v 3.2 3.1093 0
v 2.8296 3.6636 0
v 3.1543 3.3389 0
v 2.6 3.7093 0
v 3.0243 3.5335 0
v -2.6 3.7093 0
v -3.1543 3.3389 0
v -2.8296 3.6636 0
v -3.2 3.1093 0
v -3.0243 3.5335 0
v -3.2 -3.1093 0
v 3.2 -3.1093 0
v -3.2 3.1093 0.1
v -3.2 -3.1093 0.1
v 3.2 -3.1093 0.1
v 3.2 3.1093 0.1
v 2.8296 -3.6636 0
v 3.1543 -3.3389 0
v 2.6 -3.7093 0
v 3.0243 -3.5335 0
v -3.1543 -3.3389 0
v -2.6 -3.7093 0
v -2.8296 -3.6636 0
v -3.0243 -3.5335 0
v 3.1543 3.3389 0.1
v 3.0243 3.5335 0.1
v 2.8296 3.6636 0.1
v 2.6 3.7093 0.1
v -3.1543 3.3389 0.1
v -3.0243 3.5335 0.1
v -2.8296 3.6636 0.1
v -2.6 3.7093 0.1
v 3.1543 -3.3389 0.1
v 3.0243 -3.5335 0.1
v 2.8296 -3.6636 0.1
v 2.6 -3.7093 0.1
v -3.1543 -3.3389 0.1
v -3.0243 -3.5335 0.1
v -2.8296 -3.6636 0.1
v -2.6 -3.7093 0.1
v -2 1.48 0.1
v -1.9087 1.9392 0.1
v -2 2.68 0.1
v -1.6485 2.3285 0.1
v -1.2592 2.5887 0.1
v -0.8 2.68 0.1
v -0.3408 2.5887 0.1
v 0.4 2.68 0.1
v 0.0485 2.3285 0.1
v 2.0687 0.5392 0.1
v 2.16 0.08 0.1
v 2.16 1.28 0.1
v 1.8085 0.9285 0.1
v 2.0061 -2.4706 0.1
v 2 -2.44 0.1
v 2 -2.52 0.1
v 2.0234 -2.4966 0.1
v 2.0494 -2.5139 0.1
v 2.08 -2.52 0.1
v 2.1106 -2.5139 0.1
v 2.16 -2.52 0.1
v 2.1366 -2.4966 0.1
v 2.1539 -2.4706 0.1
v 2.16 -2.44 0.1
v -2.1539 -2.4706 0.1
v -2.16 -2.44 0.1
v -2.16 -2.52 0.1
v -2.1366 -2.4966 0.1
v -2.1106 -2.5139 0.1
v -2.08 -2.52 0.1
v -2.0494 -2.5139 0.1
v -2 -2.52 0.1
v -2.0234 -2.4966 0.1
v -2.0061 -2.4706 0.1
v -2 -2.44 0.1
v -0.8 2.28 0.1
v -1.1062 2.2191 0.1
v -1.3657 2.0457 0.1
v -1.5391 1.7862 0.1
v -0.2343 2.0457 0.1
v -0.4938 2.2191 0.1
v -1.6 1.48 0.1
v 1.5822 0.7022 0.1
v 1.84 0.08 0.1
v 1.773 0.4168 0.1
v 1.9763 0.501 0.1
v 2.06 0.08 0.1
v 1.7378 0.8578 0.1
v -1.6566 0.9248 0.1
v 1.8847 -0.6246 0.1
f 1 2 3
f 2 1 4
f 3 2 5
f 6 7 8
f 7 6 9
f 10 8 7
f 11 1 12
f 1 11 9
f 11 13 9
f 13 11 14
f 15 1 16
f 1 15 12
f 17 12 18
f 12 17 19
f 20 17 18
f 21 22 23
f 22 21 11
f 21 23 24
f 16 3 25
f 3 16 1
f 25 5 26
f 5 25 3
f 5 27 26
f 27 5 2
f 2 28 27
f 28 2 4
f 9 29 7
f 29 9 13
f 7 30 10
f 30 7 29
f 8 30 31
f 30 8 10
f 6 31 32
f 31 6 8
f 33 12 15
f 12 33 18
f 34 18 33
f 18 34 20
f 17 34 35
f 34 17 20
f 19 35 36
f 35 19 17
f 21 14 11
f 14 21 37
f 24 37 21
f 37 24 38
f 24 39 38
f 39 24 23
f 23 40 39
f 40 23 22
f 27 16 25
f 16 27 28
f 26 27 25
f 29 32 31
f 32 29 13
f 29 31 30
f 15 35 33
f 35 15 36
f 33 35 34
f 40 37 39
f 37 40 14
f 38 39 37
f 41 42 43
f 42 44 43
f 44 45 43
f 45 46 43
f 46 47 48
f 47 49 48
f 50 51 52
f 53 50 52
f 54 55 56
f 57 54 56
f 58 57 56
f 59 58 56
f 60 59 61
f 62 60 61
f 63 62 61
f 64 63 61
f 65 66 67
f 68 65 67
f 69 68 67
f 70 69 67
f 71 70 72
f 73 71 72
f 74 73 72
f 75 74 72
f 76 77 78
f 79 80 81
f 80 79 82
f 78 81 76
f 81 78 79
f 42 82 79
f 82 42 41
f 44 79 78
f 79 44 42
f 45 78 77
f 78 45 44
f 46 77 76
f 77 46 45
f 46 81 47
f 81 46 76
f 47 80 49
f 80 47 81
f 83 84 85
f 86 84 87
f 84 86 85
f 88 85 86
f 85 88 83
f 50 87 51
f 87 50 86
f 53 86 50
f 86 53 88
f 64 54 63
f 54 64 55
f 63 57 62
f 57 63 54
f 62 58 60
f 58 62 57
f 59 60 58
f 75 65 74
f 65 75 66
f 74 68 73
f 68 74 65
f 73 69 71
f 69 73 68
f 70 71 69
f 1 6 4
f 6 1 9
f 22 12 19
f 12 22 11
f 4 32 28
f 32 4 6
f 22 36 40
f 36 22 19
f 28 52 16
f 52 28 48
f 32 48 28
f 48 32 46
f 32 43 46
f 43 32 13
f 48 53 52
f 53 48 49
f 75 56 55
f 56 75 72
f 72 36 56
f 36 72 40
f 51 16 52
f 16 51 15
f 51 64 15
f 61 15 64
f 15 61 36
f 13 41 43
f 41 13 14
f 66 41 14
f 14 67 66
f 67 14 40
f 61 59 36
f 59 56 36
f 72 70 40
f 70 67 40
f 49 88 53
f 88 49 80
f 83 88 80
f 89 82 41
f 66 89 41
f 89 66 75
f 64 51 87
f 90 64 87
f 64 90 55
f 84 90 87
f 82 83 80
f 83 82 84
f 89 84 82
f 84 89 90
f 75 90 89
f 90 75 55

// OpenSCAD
// file: ../p/box3u12.scad
use <../lib.scad>
function ldraw_lib__box3u12() = [
// 0 Box with 3 Parallel Faces without Any Edges
// 0 Name: box3u12.dat
// 0 Author: J.C. Tchang [tchang]
// 0 !LDRAW_ORG Primitive UPDATE 2014-02
// 0 !LICENSE Licensed under CC BY 4.0 : see CAreadme.txt
// 
// 0 BFC CERTIFY CCW
  [0,"BFC","CERTIFY"],
  [0,"BFC","CCW"],
// 
// 0 !HISTORY 2014-12-23 [PTadmin] Official Update 2014-02
// 
// 
// 4 16 -1 1 1 1 1 1 1 1 -1 -1 1 -1
  [4,16,-1,1,1,1,1,1,1,1,-1,-1,1,-1],
// 4 16 -1 1 1 -1 0 1 1 0 1 1 1 1
  [4,16,-1,1,1,-1,0,1,1,0,1,1,1,1],
// 4 16 1 1 -1 1 0 -1 -1 0 -1 -1 1 -1
  [4,16,1,1,-1,1,0,-1,-1,0,-1,-1,1,-1],
];
module ldraw_lib__box3u12(step=0, col=false, unit=2/5, alt=false, line=0.2, solid=!$preview)
    makepoly(ldraw_lib__box3u12(), step=step, col=col, unit=unit, alt=alt, line=line, solid=solid);
ldraw_lib__box3u12(line=0.2);
// file: ../p/3-8ring2.scad
use <../lib.scad>
function ldraw_lib__3_8ring2() = [
// 0 Ring  2 x 0.375
// 0 Name: 3-8ring2.dat
// 0 Author: Willy Tschager [Holly-Wood]
// 0 !LDRAW_ORG Primitive UPDATE 2024-01
// 0 !LICENSE Licensed under CC BY 4.0 : see CAreadme.txt
// 
// 0 BFC CERTIFY CCW
  [0,"BFC","CERTIFY"],
  [0,"BFC","CCW"],
// 
// 0 !HISTORY 2005-12-28 [PTadmin] Official Update 2005-01
// 0 !HISTORY 2007-06-24 [PTadmin] Header formatted for Contributor Agreement
// 0 !HISTORY 2008-07-01 [PTadmin] Official Update 2008-01
// 0 !HISTORY 2024-01-11 [Holly-Wood] Complete regeneration, original by guyvivan
// 0 !HISTORY 2024-01-29 [OrionP] Official Update 2024-01
// 
// 4 16 3 0 0 2.7717 0 1.1481 1.8478 0 0.7654 2 0 0
  [4,16,3,0,0,2.7717,0,1.1481,1.8478,0,0.7654,2,0,0],
// 4 16 2.7717 0 1.1481 2.1213 0 2.1213 1.4142 0 1.4142 1.8478 0 0.7654
  [4,16,2.7717,0,1.1481,2.1213,0,2.1213,1.4142,0,1.4142,1.8478,0,0.7654],
// 4 16 2.1213 0 2.1213 1.1481 0 2.7717 0.7654 0 1.8478 1.4142 0 1.4142
  [4,16,2.1213,0,2.1213,1.1481,0,2.7717,0.7654,0,1.8478,1.4142,0,1.4142],
// 4 16 1.1481 0 2.7717 0 0 3 0 0 2 0.7654 0 1.8478
  [4,16,1.1481,0,2.7717,0,0,3,0,0,2,0.7654,0,1.8478],
// 4 16 0 0 3 -1.1481 0 2.7717 -0.7654 0 1.8478 0 0 2
  [4,16,0,0,3,-1.1481,0,2.7717,-0.7654,0,1.8478,0,0,2],
// 4 16 -1.1481 0 2.7717 -2.1213 0 2.1213 -1.4142 0 1.4142 -0.7654 0 1.8478
  [4,16,-1.1481,0,2.7717,-2.1213,0,2.1213,-1.4142,0,1.4142,-0.7654,0,1.8478],
// 0 // Build by LDPartEditor (PrimGen 2.X)
];
module ldraw_lib__3_8ring2(step=0, col=false, unit=2/5, alt=false, line=0.2, solid=!$preview)
    makepoly(ldraw_lib__3_8ring2(), step=step, col=col, unit=unit, alt=alt, line=line, solid=solid);
ldraw_lib__3_8ring2(line=0.2);
// file: ../p/3-8ndis.scad
use <../lib.scad>
function ldraw_lib__3_8ndis() = [
// 0 Disc Negative 0.375
// 0 Name: 3-8ndis.dat
// 0 Author: Alex Taylor [anathema]
// 0 !LDRAW_ORG Primitive UPDATE 2009-02
// 0 !LICENSE Licensed under CC BY 4.0 : see CAreadme.txt
// 
// 0 BFC CERTIFY CCW
  [0,"BFC","CERTIFY"],
  [0,"BFC","CCW"],
// 
// 0 !HISTORY 2009-09-03 [PTadmin] Official Update 2009-02
// 
// 
// 3 16 1 0 1 0.9239 0 0.3827 1 0 0
  [3,16,1,0,1,0.9239,0,0.3827,1,0,0],
// 3 16 1 0 1 0.7071 0 0.7071 0.9239 0 0.3827
  [3,16,1,0,1,0.7071,0,0.7071,0.9239,0,0.3827],
// 3 16 1 0 1 0.3827 0 0.9239 0.7071 0 0.7071
  [3,16,1,0,1,0.3827,0,0.9239,0.7071,0,0.7071],
// 3 16 1 0 1 0 0 1 0.3827 0 0.9239
  [3,16,1,0,1,0,0,1,0.3827,0,0.9239],
// 3 16 -1 0 1 -0.3827 0 0.9239 0 0 1
  [3,16,-1,0,1,-0.3827,0,0.9239,0,0,1],
// 3 16 -1 0 1 -0.7071 0 0.7071 -0.3827 0 0.9239
  [3,16,-1,0,1,-0.7071,0,0.7071,-0.3827,0,0.9239],
// 0
];
module ldraw_lib__3_8ndis(step=0, col=false, unit=2/5, alt=false, line=0.2, solid=!$preview)
    makepoly(ldraw_lib__3_8ndis(), step=step, col=col, unit=unit, alt=alt, line=line, solid=solid);
ldraw_lib__3_8ndis(line=0.2);
// file: ../p/3-8chrd.scad
use <../lib.scad>
function ldraw_lib__3_8chrd() = [
// 0 Chord 0.375
// 0 Name: 3-8chrd.dat
// 0 Author: Donald Sutter [technog]
// 0 !LDRAW_ORG Primitive UPDATE 2005-01
// 0 !LICENSE Licensed under CC BY 4.0 : see CAreadme.txt
// 
// 0 BFC CERTIFY CCW
  [0,"BFC","CERTIFY"],
  [0,"BFC","CCW"],
// 
// 0 !HISTORY 2004-01-07 [Steffen] added primitive code for POVray
// 0 !HISTORY 2004-03-18 [mkennedy] removed pov code and rearanged polygons.
// 0 !HISTORY 2004-09-12 [cwdee] reversed winding and standardised precision
// 0 !HISTORY 2005-12-28 [PTadmin] Official Update 2005-01
// 0 !HISTORY 2007-06-24 [PTadmin] Header formatted for Contributor Agreement
// 0 !HISTORY 2008-07-01 [PTadmin] Official Update 2008-01
// 
// 
// 3 16 0.7071 0 0.7071 0.3827 0 0.9239 0 0 1
  [3,16,0.7071,0,0.7071,0.3827,0,0.9239,0,0,1],
// 4 16 0.9239 0 0.3827 -0.3827 0 0.9239 -0.7071 0 0.7071 1 0 0
  [4,16,0.9239,0,0.3827,-0.3827,0,0.9239,-0.7071,0,0.7071,1,0,0],
// 4 16 0.7071 0 0.7071 0 0 1 -0.3827 0 0.9239 0.9239 0 0.3827
  [4,16,0.7071,0,0.7071,0,0,1,-0.3827,0,0.9239,0.9239,0,0.3827],
// 0
];
module ldraw_lib__3_8chrd(step=0, col=false, unit=2/5, alt=false, line=0.2, solid=!$preview)
    makepoly(ldraw_lib__3_8chrd(), step=step, col=col, unit=unit, alt=alt, line=line, solid=solid);
ldraw_lib__3_8chrd(line=0.2);
// file: ../p/2-4ndis.scad
use <../lib.scad>
function ldraw_lib__2_4ndis() = [
// 0 Disc Negative 0.5
// 0 Name: 2-4ndis.dat
// 0 Author: James Jessiman
// 0 !LDRAW_ORG Primitive UPDATE 2012-01
// 0 !LICENSE Licensed under CC BY 4.0 : see CAreadme.txt
// 
// 0 BFC CERTIFY CCW
  [0,"BFC","CERTIFY"],
  [0,"BFC","CCW"],
// 
// 0 !HISTORY 2002-03-23 [sbliss] Added BFC statement; compacted code
// 0 !HISTORY 2002-04-25 [PTadmin] Official Update 2002-02
// 0 !HISTORY 2007-06-24 [PTadmin] Header formatted for Contributor Agreement
// 0 !HISTORY 2008-07-01 [PTadmin] Official Update 2008-01
// 0 !HISTORY 2012-02-16 [Philo] Changed to CCW
// 0 !HISTORY 2012-03-30 [PTadmin] Official Update 2012-01
// 
// 
// 3 16 0.9239 0 0.3827 1 0 0 1 0 1
  [3,16,0.9239,0,0.3827,1,0,0,1,0,1],
// 3 16 0.7071 0 0.7071 0.9239 0 0.3827 1 0 1
  [3,16,0.7071,0,0.7071,0.9239,0,0.3827,1,0,1],
// 3 16 0.3827 0 0.9239 0.7071 0 0.7071 1 0 1
  [3,16,0.3827,0,0.9239,0.7071,0,0.7071,1,0,1],
// 3 16 0 0 1 0.3827 0 0.9239 1 0 1
  [3,16,0,0,1,0.3827,0,0.9239,1,0,1],
// 3 16 -0.3827 0 0.9239 0 0 1 -1 0 1
  [3,16,-0.3827,0,0.9239,0,0,1,-1,0,1],
// 3 16 -0.7071 0 0.7071 -0.3827 0 0.9239 -1 0 1
  [3,16,-0.7071,0,0.7071,-0.3827,0,0.9239,-1,0,1],
// 3 16 -0.9239 0 0.3827 -0.7071 0 0.7071 -1 0 1
  [3,16,-0.9239,0,0.3827,-0.7071,0,0.7071,-1,0,1],
// 3 16 -1 0 0 -0.9239 0 0.3827 -1 0 1
  [3,16,-1,0,0,-0.9239,0,0.3827,-1,0,1],
];
module ldraw_lib__2_4ndis(step=0, col=false, unit=2/5, alt=false, line=0.2, solid=!$preview)
    makepoly(ldraw_lib__2_4ndis(), step=step, col=col, unit=unit, alt=alt, line=line, solid=solid);
ldraw_lib__2_4ndis(line=0.2);
// file: ../p/2-4chrd.scad
use <../lib.scad>
function ldraw_lib__2_4chrd() = [
// 0 Chord 0.5
// 0 Name: 2-4chrd.dat
// 0 Author: Philippe Hurbain [Philo]
// 0 !LDRAW_ORG Primitive UPDATE 2014-01
// 0 !LICENSE Licensed under CC BY 4.0 : see CAreadme.txt
// 
// 0 BFC CERTIFY CCW
  [0,"BFC","CERTIFY"],
  [0,"BFC","CCW"],
// 
// 0 !HISTORY 2014-06-21 [PTadmin] Official Update 2014-01
// 
// 
// 4 16 0.9239 0 0.3827 -0.9239 0 0.3827 -1 0 0 1 0 0
  [4,16,0.9239,0,0.3827,-0.9239,0,0.3827,-1,0,0,1,0,0],
// 4 16 0.7071 0 0.7071 -0.7071 0 0.7071 -0.9239 0 0.3827 0.9239 0 0.3827
  [4,16,0.7071,0,0.7071,-0.7071,0,0.7071,-0.9239,0,0.3827,0.9239,0,0.3827],
// 4 16 0.3827 0 0.9239 -0.3827 0 0.9239 -0.7071 0 0.7071 0.7071 0 0.7071
  [4,16,0.3827,0,0.9239,-0.3827,0,0.9239,-0.7071,0,0.7071,0.7071,0,0.7071],
// 3 16 0 0 1 -0.3827 0 0.9239 0.3827 0 0.9239
  [3,16,0,0,1,-0.3827,0,0.9239,0.3827,0,0.9239],
];
module ldraw_lib__2_4chrd(step=0, col=false, unit=2/5, alt=false, line=0.2, solid=!$preview)
    makepoly(ldraw_lib__2_4chrd(), step=step, col=col, unit=unit, alt=alt, line=line, solid=solid);
ldraw_lib__2_4chrd(line=0.2);
// file: ../p/1-8ring4.scad
use <../lib.scad>
function ldraw_lib__1_8ring4() = [
// 0 Ring  4 x 0.125
// 0 Name: 1-8ring4.dat
// 0 Author: Willy Tschager [Holly-Wood]
// 0 !LDRAW_ORG Primitive UPDATE 2024-01
// 0 !LICENSE Licensed under CC BY 4.0 : see CAreadme.txt
// 
// 0 BFC CERTIFY CCW
  [0,"BFC","CERTIFY"],
  [0,"BFC","CCW"],
// 
// 0 !HISTORY 2005-12-28 [PTadmin] Official Update 2005-01
// 0 !HISTORY 2007-06-22 [PTadmin] Header formatted for Contributor Agreement
// 0 !HISTORY 2008-07-01 [PTadmin] Official Update 2008-01
// 0 !HISTORY 2024-01-14 [Holly-Wood] Complete regeneration, original by guyvivan
// 0 !HISTORY 2024-01-29 [OrionP] Official Update 2024-01
// 
// 4 16 5 0 0 4.6195 0 1.9135 3.6956 0 1.5308 4 0 0
  [4,16,5,0,0,4.6195,0,1.9135,3.6956,0,1.5308,4,0,0],
// 4 16 4.6195 0 1.9135 3.5355 0 3.5355 2.8284 0 2.8284 3.6956 0 1.5308
  [4,16,4.6195,0,1.9135,3.5355,0,3.5355,2.8284,0,2.8284,3.6956,0,1.5308],
// 0 // Build by LDPartEditor (PrimGen 2.X)
];
module ldraw_lib__1_8ring4(step=0, col=false, unit=2/5, alt=false, line=0.2, solid=!$preview)
    makepoly(ldraw_lib__1_8ring4(), step=step, col=col, unit=unit, alt=alt, line=line, solid=solid);
ldraw_lib__1_8ring4(line=0.2);
// file: ../p/1-8ring11.scad
use <../lib.scad>
function ldraw_lib__1_8ring11() = [
// 0 Ring 11 x 0.125
// 0 Name: 1-8ring11.dat
// 0 Author: Magnus Forsberg [MagFors]
// 0 !LDRAW_ORG Primitive UPDATE 2022-02
// 0 !LICENSE Licensed under CC BY 4.0 : see CAreadme.txt
// 
// 0 BFC CERTIFY CCW
  [0,"BFC","CERTIFY"],
  [0,"BFC","CCW"],
// 
// 0 !HISTORY 2022-03-06 [PTadmin] Official Update 2022-02
// 
// 
// 4 16 12 0 0 11.0868 0 4.5924 10.1629 0 4.2097 11 0 0
  [4,16,12,0,0,11.0868,0,4.5924,10.1629,0,4.2097,11,0,0],
// 4 16 11.0868 0 4.5924 8.4852 0 8.4852 7.7781 0 7.7781 10.1629 0 4.2097
  [4,16,11.0868,0,4.5924,8.4852,0,8.4852,7.7781,0,7.7781,10.1629,0,4.2097],
// 0 // Build by Primitive Generator 2
];
module ldraw_lib__1_8ring11(step=0, col=false, unit=2/5, alt=false, line=0.2, solid=!$preview)
    makepoly(ldraw_lib__1_8ring11(), step=step, col=col, unit=unit, alt=alt, line=line, solid=solid);
ldraw_lib__1_8ring11(line=0.2);
// file: ../p/1-8ndis.scad
use <../lib.scad>
function ldraw_lib__1_8ndis() = [
// 0 Disc Negative 0.125
// 0 Name: 1-8ndis.dat
// 0 Author: James Jessiman
// 0 !LDRAW_ORG Primitive UPDATE 2012-01
// 0 !LICENSE Licensed under CC BY 4.0 : see CAreadme.txt
// 
// 0 BFC CERTIFY CCW
  [0,"BFC","CERTIFY"],
  [0,"BFC","CCW"],
// 
// 0 !HISTORY 2002-03-23 [sbliss] Added BFC statement
// 0 !HISTORY 2002-04-25 [PTadmin] Official Update 2002-02
// 0 !HISTORY 2007-06-22 [PTadmin] Header formatted for Contributor Agreement
// 0 !HISTORY 2008-07-01 [PTadmin] Official Update 2008-01
// 0 !HISTORY 2012-02-16 [Philo] Changed to CCW
// 0 !HISTORY 2012-03-30 [PTadmin] Official Update 2012-01
// 
// 
// 3 16 0.9239 0 0.3827 1 0 0 1 0 1
  [3,16,0.9239,0,0.3827,1,0,0,1,0,1],
// 3 16 0.7071 0 0.7071 0.9239 0 0.3827 1 0 1
  [3,16,0.7071,0,0.7071,0.9239,0,0.3827,1,0,1],
];
module ldraw_lib__1_8ndis(step=0, col=false, unit=2/5, alt=false, line=0.2, solid=!$preview)
    makepoly(ldraw_lib__1_8ndis(), step=step, col=col, unit=unit, alt=alt, line=line, solid=solid);
ldraw_lib__1_8ndis(line=0.2);
// file: ../p/1-8chrd.scad
use <../lib.scad>
function ldraw_lib__1_8chrd() = [
// 0 Chord 0.125
// 0 Name: 1-8chrd.dat
// 0 Author: Orion Pobursky [OrionP]
// 0 !LDRAW_ORG Primitive UPDATE 2023-05
// 0 !LICENSE Licensed under CC BY 4.0 : see CAreadme.txt
// 
// 0 BFC CERTIFY CCW
  [0,"BFC","CERTIFY"],
  [0,"BFC","CCW"],
// 
// 0 !HISTORY 2004-04-22 [PTadmin] Official Update 2004-02
// 0 !HISTORY 2007-06-22 [PTadmin] Header formatted for Contributor Agreement
// 0 !HISTORY 2008-07-01 [PTadmin] Official Update 2008-01
// 0 !HISTORY 2023-10-27 [OrionP] Rebuilt with PrimGen2, original author westrate
// 0 !HISTORY 2023-10-31 [OrionP] Official Update 2023-05
// 
// 3 16 1 0 0 0.9239 0 0.3827 0.7071 0 0.7071
  [3,16,1,0,0,0.9239,0,0.3827,0.7071,0,0.7071],
];
module ldraw_lib__1_8chrd(step=0, col=false, unit=2/5, alt=false, line=0.2, solid=!$preview)
    makepoly(ldraw_lib__1_8chrd(), step=step, col=col, unit=unit, alt=alt, line=line, solid=solid);
ldraw_lib__1_8chrd(line=0.2);
// file: ../p/1-4cyli.scad
use <../lib.scad>
function ldraw_lib__1_4cyli() = [
// 0 Cylinder 0.25
// 0 Name: 1-4cyli.dat
// 0 Author: James Jessiman
// 0 !LDRAW_ORG Primitive UPDATE 2012-01
// 0 !LICENSE Licensed under CC BY 4.0 : see CAreadme.txt
// 
// 0 BFC CERTIFY CCW
  [0,"BFC","CERTIFY"],
  [0,"BFC","CCW"],
// 
// 0 !HISTORY 2002-03-23 [sbliss] Added BFC statement.
// 0 !HISTORY 2002-04-25 [PTadmin] Official Update 2002-02
// 0 !HISTORY 2007-06-22 [PTadmin] Header formatted for Contributor Agreement
// 0 !HISTORY 2008-07-01 [PTadmin] Official Update 2008-01
// 0 !HISTORY 2012-02-16 [Philo] Changed to CCW
// 0 !HISTORY 2012-03-30 [PTadmin] Official Update 2012-01
// 
// 
// 4 16 1 1 0 0.9239 1 0.3827 0.9239 0 0.3827 1 0 0
  [4,16,1,1,0,0.9239,1,0.3827,0.9239,0,0.3827,1,0,0],
// 5 24 1 0 0 1 1 0 0.9239 0 0.3827 1 0 -1
  [5,24,1,0,0,1,1,0,0.9239,0,0.3827,1,0,-1],
// 4 16 0.9239 1 0.3827 0.7071 1 0.7071 0.7071 0 0.7071 0.9239 0 0.3827
  [4,16,0.9239,1,0.3827,0.7071,1,0.7071,0.7071,0,0.7071,0.9239,0,0.3827],
// 5 24 0.9239 0 0.3827 0.9239 1 0.3827 0.7071 0 0.7071 1 0 0
  [5,24,0.9239,0,0.3827,0.9239,1,0.3827,0.7071,0,0.7071,1,0,0],
// 4 16 0.7071 1 0.7071 0.3827 1 0.9239 0.3827 0 0.9239 0.7071 0 0.7071
  [4,16,0.7071,1,0.7071,0.3827,1,0.9239,0.3827,0,0.9239,0.7071,0,0.7071],
// 5 24 0.7071 0 0.7071 0.7071 1 0.7071 0.3827 0 0.9239 0.9239 0 0.3827
  [5,24,0.7071,0,0.7071,0.7071,1,0.7071,0.3827,0,0.9239,0.9239,0,0.3827],
// 4 16 0.3827 1 0.9239 0 1 1 0 0 1 0.3827 0 0.9239
  [4,16,0.3827,1,0.9239,0,1,1,0,0,1,0.3827,0,0.9239],
// 5 24 0.3827 0 0.9239 0.3827 1 0.9239 0 0 1 0.7071 0 0.7071
  [5,24,0.3827,0,0.9239,0.3827,1,0.9239,0,0,1,0.7071,0,0.7071],
// 5 24 0 0 1 0 1 1 0.3827 0 0.9239 -1 0 1
  [5,24,0,0,1,0,1,1,0.3827,0,0.9239,-1,0,1],
];
module ldraw_lib__1_4cyli(step=0, col=false, unit=2/5, alt=false, line=0.2, solid=!$preview)
    makepoly(ldraw_lib__1_4cyli(), step=step, col=col, unit=unit, alt=alt, line=line, solid=solid);
ldraw_lib__1_4cyli(line=0.2);
// file: ../p/1-4chrd.scad
use <../lib.scad>
function ldraw_lib__1_4chrd() = [
// 0 Chord 0.25
// 0 Name: 1-4chrd.dat
// 0 Author: Max Martin Richter [MMR1988]
// 0 !LDRAW_ORG Primitive UPDATE 2023-05
// 0 !LICENSE Licensed under CC BY 4.0 : see CAreadme.txt
// 
// 0 BFC CERTIFY CCW
  [0,"BFC","CERTIFY"],
  [0,"BFC","CCW"],
// 
// 0 !HISTORY 2004-04-22 [PTadmin] Official Update 2004-02
// 0 !HISTORY 2007-10-09 [PTadmin] Header formatted for Contributor Agreement
// 0 !HISTORY 2008-07-01 [PTadmin] Official Update 2008-01
// 0 !HISTORY 2012-08-02 [MMR1988] Re-creation with PrimGen2 and Rectifier
// 0 !HISTORY 2012-08-09 [PTadmin] Official Update 2012-02
// 0 !HISTORY 2023-10-27 [OrionP] Change author to MMR1988 from hafhead
// 0 !HISTORY 2023-10-31 [OrionP] Official Update 2023-05
// 
// 4 16 0.9239 0 0.3827 0.3827 0 0.9239 0 0 1 1 0 0
  [4,16,0.9239,0,0.3827,0.3827,0,0.9239,0,0,1,1,0,0],
// 3 16 0.7071 0 0.7071 0.3827 0 0.9239 0.9239 0 0.3827
  [3,16,0.7071,0,0.7071,0.3827,0,0.9239,0.9239,0,0.3827],
];
module ldraw_lib__1_4chrd(step=0, col=false, unit=2/5, alt=false, line=0.2, solid=!$preview)
    makepoly(ldraw_lib__1_4chrd(), step=step, col=col, unit=unit, alt=alt, line=line, solid=solid);
ldraw_lib__1_4chrd(line=0.2);
// main file
use <../lib.scad>
use <6177741c.scad>
function ldraw_lib__6177741f() = [
// 0 Sticker  0.9 x  0.8 with Black Grille on Transparent Background Left
// 0 Name: 6177741f.dat
// 0 Author: Massimo Maso [Sirio]
// 0 !LDRAW_ORG Part UPDATE 2025-05
// 0 !LICENSE Licensed under CC BY 4.0 : see CAreadme.txt
// 
// 0 BFC CERTIFY CCW
  [0,"BFC","CERTIFY"],
  [0,"BFC","CCW"],
// 
// 0 !KEYWORDS AMG, GT3, Mercedes, Set 75877, Speed Champions
// 
// 0 !HISTORY 2025-05-28 [OrionP] Official Update 2025-05
// 
// 
// 1 16 0 0 0 -1 0 0 0 1 0 0 0 1 6177741c.dat
  [1,16,0,0,0,-1,0,0,0,1,0,0,0,1, ldraw_lib__6177741c()],
];
module ldraw_lib__6177741f(step=0, col=false, unit=2/5, alt=false, line=0.2, solid=!$preview)
    makepoly(ldraw_lib__6177741f(), step=step, col=col, unit=unit, alt=alt, line=line, solid=solid);
ldraw_lib__6177741f(line=0.2);
